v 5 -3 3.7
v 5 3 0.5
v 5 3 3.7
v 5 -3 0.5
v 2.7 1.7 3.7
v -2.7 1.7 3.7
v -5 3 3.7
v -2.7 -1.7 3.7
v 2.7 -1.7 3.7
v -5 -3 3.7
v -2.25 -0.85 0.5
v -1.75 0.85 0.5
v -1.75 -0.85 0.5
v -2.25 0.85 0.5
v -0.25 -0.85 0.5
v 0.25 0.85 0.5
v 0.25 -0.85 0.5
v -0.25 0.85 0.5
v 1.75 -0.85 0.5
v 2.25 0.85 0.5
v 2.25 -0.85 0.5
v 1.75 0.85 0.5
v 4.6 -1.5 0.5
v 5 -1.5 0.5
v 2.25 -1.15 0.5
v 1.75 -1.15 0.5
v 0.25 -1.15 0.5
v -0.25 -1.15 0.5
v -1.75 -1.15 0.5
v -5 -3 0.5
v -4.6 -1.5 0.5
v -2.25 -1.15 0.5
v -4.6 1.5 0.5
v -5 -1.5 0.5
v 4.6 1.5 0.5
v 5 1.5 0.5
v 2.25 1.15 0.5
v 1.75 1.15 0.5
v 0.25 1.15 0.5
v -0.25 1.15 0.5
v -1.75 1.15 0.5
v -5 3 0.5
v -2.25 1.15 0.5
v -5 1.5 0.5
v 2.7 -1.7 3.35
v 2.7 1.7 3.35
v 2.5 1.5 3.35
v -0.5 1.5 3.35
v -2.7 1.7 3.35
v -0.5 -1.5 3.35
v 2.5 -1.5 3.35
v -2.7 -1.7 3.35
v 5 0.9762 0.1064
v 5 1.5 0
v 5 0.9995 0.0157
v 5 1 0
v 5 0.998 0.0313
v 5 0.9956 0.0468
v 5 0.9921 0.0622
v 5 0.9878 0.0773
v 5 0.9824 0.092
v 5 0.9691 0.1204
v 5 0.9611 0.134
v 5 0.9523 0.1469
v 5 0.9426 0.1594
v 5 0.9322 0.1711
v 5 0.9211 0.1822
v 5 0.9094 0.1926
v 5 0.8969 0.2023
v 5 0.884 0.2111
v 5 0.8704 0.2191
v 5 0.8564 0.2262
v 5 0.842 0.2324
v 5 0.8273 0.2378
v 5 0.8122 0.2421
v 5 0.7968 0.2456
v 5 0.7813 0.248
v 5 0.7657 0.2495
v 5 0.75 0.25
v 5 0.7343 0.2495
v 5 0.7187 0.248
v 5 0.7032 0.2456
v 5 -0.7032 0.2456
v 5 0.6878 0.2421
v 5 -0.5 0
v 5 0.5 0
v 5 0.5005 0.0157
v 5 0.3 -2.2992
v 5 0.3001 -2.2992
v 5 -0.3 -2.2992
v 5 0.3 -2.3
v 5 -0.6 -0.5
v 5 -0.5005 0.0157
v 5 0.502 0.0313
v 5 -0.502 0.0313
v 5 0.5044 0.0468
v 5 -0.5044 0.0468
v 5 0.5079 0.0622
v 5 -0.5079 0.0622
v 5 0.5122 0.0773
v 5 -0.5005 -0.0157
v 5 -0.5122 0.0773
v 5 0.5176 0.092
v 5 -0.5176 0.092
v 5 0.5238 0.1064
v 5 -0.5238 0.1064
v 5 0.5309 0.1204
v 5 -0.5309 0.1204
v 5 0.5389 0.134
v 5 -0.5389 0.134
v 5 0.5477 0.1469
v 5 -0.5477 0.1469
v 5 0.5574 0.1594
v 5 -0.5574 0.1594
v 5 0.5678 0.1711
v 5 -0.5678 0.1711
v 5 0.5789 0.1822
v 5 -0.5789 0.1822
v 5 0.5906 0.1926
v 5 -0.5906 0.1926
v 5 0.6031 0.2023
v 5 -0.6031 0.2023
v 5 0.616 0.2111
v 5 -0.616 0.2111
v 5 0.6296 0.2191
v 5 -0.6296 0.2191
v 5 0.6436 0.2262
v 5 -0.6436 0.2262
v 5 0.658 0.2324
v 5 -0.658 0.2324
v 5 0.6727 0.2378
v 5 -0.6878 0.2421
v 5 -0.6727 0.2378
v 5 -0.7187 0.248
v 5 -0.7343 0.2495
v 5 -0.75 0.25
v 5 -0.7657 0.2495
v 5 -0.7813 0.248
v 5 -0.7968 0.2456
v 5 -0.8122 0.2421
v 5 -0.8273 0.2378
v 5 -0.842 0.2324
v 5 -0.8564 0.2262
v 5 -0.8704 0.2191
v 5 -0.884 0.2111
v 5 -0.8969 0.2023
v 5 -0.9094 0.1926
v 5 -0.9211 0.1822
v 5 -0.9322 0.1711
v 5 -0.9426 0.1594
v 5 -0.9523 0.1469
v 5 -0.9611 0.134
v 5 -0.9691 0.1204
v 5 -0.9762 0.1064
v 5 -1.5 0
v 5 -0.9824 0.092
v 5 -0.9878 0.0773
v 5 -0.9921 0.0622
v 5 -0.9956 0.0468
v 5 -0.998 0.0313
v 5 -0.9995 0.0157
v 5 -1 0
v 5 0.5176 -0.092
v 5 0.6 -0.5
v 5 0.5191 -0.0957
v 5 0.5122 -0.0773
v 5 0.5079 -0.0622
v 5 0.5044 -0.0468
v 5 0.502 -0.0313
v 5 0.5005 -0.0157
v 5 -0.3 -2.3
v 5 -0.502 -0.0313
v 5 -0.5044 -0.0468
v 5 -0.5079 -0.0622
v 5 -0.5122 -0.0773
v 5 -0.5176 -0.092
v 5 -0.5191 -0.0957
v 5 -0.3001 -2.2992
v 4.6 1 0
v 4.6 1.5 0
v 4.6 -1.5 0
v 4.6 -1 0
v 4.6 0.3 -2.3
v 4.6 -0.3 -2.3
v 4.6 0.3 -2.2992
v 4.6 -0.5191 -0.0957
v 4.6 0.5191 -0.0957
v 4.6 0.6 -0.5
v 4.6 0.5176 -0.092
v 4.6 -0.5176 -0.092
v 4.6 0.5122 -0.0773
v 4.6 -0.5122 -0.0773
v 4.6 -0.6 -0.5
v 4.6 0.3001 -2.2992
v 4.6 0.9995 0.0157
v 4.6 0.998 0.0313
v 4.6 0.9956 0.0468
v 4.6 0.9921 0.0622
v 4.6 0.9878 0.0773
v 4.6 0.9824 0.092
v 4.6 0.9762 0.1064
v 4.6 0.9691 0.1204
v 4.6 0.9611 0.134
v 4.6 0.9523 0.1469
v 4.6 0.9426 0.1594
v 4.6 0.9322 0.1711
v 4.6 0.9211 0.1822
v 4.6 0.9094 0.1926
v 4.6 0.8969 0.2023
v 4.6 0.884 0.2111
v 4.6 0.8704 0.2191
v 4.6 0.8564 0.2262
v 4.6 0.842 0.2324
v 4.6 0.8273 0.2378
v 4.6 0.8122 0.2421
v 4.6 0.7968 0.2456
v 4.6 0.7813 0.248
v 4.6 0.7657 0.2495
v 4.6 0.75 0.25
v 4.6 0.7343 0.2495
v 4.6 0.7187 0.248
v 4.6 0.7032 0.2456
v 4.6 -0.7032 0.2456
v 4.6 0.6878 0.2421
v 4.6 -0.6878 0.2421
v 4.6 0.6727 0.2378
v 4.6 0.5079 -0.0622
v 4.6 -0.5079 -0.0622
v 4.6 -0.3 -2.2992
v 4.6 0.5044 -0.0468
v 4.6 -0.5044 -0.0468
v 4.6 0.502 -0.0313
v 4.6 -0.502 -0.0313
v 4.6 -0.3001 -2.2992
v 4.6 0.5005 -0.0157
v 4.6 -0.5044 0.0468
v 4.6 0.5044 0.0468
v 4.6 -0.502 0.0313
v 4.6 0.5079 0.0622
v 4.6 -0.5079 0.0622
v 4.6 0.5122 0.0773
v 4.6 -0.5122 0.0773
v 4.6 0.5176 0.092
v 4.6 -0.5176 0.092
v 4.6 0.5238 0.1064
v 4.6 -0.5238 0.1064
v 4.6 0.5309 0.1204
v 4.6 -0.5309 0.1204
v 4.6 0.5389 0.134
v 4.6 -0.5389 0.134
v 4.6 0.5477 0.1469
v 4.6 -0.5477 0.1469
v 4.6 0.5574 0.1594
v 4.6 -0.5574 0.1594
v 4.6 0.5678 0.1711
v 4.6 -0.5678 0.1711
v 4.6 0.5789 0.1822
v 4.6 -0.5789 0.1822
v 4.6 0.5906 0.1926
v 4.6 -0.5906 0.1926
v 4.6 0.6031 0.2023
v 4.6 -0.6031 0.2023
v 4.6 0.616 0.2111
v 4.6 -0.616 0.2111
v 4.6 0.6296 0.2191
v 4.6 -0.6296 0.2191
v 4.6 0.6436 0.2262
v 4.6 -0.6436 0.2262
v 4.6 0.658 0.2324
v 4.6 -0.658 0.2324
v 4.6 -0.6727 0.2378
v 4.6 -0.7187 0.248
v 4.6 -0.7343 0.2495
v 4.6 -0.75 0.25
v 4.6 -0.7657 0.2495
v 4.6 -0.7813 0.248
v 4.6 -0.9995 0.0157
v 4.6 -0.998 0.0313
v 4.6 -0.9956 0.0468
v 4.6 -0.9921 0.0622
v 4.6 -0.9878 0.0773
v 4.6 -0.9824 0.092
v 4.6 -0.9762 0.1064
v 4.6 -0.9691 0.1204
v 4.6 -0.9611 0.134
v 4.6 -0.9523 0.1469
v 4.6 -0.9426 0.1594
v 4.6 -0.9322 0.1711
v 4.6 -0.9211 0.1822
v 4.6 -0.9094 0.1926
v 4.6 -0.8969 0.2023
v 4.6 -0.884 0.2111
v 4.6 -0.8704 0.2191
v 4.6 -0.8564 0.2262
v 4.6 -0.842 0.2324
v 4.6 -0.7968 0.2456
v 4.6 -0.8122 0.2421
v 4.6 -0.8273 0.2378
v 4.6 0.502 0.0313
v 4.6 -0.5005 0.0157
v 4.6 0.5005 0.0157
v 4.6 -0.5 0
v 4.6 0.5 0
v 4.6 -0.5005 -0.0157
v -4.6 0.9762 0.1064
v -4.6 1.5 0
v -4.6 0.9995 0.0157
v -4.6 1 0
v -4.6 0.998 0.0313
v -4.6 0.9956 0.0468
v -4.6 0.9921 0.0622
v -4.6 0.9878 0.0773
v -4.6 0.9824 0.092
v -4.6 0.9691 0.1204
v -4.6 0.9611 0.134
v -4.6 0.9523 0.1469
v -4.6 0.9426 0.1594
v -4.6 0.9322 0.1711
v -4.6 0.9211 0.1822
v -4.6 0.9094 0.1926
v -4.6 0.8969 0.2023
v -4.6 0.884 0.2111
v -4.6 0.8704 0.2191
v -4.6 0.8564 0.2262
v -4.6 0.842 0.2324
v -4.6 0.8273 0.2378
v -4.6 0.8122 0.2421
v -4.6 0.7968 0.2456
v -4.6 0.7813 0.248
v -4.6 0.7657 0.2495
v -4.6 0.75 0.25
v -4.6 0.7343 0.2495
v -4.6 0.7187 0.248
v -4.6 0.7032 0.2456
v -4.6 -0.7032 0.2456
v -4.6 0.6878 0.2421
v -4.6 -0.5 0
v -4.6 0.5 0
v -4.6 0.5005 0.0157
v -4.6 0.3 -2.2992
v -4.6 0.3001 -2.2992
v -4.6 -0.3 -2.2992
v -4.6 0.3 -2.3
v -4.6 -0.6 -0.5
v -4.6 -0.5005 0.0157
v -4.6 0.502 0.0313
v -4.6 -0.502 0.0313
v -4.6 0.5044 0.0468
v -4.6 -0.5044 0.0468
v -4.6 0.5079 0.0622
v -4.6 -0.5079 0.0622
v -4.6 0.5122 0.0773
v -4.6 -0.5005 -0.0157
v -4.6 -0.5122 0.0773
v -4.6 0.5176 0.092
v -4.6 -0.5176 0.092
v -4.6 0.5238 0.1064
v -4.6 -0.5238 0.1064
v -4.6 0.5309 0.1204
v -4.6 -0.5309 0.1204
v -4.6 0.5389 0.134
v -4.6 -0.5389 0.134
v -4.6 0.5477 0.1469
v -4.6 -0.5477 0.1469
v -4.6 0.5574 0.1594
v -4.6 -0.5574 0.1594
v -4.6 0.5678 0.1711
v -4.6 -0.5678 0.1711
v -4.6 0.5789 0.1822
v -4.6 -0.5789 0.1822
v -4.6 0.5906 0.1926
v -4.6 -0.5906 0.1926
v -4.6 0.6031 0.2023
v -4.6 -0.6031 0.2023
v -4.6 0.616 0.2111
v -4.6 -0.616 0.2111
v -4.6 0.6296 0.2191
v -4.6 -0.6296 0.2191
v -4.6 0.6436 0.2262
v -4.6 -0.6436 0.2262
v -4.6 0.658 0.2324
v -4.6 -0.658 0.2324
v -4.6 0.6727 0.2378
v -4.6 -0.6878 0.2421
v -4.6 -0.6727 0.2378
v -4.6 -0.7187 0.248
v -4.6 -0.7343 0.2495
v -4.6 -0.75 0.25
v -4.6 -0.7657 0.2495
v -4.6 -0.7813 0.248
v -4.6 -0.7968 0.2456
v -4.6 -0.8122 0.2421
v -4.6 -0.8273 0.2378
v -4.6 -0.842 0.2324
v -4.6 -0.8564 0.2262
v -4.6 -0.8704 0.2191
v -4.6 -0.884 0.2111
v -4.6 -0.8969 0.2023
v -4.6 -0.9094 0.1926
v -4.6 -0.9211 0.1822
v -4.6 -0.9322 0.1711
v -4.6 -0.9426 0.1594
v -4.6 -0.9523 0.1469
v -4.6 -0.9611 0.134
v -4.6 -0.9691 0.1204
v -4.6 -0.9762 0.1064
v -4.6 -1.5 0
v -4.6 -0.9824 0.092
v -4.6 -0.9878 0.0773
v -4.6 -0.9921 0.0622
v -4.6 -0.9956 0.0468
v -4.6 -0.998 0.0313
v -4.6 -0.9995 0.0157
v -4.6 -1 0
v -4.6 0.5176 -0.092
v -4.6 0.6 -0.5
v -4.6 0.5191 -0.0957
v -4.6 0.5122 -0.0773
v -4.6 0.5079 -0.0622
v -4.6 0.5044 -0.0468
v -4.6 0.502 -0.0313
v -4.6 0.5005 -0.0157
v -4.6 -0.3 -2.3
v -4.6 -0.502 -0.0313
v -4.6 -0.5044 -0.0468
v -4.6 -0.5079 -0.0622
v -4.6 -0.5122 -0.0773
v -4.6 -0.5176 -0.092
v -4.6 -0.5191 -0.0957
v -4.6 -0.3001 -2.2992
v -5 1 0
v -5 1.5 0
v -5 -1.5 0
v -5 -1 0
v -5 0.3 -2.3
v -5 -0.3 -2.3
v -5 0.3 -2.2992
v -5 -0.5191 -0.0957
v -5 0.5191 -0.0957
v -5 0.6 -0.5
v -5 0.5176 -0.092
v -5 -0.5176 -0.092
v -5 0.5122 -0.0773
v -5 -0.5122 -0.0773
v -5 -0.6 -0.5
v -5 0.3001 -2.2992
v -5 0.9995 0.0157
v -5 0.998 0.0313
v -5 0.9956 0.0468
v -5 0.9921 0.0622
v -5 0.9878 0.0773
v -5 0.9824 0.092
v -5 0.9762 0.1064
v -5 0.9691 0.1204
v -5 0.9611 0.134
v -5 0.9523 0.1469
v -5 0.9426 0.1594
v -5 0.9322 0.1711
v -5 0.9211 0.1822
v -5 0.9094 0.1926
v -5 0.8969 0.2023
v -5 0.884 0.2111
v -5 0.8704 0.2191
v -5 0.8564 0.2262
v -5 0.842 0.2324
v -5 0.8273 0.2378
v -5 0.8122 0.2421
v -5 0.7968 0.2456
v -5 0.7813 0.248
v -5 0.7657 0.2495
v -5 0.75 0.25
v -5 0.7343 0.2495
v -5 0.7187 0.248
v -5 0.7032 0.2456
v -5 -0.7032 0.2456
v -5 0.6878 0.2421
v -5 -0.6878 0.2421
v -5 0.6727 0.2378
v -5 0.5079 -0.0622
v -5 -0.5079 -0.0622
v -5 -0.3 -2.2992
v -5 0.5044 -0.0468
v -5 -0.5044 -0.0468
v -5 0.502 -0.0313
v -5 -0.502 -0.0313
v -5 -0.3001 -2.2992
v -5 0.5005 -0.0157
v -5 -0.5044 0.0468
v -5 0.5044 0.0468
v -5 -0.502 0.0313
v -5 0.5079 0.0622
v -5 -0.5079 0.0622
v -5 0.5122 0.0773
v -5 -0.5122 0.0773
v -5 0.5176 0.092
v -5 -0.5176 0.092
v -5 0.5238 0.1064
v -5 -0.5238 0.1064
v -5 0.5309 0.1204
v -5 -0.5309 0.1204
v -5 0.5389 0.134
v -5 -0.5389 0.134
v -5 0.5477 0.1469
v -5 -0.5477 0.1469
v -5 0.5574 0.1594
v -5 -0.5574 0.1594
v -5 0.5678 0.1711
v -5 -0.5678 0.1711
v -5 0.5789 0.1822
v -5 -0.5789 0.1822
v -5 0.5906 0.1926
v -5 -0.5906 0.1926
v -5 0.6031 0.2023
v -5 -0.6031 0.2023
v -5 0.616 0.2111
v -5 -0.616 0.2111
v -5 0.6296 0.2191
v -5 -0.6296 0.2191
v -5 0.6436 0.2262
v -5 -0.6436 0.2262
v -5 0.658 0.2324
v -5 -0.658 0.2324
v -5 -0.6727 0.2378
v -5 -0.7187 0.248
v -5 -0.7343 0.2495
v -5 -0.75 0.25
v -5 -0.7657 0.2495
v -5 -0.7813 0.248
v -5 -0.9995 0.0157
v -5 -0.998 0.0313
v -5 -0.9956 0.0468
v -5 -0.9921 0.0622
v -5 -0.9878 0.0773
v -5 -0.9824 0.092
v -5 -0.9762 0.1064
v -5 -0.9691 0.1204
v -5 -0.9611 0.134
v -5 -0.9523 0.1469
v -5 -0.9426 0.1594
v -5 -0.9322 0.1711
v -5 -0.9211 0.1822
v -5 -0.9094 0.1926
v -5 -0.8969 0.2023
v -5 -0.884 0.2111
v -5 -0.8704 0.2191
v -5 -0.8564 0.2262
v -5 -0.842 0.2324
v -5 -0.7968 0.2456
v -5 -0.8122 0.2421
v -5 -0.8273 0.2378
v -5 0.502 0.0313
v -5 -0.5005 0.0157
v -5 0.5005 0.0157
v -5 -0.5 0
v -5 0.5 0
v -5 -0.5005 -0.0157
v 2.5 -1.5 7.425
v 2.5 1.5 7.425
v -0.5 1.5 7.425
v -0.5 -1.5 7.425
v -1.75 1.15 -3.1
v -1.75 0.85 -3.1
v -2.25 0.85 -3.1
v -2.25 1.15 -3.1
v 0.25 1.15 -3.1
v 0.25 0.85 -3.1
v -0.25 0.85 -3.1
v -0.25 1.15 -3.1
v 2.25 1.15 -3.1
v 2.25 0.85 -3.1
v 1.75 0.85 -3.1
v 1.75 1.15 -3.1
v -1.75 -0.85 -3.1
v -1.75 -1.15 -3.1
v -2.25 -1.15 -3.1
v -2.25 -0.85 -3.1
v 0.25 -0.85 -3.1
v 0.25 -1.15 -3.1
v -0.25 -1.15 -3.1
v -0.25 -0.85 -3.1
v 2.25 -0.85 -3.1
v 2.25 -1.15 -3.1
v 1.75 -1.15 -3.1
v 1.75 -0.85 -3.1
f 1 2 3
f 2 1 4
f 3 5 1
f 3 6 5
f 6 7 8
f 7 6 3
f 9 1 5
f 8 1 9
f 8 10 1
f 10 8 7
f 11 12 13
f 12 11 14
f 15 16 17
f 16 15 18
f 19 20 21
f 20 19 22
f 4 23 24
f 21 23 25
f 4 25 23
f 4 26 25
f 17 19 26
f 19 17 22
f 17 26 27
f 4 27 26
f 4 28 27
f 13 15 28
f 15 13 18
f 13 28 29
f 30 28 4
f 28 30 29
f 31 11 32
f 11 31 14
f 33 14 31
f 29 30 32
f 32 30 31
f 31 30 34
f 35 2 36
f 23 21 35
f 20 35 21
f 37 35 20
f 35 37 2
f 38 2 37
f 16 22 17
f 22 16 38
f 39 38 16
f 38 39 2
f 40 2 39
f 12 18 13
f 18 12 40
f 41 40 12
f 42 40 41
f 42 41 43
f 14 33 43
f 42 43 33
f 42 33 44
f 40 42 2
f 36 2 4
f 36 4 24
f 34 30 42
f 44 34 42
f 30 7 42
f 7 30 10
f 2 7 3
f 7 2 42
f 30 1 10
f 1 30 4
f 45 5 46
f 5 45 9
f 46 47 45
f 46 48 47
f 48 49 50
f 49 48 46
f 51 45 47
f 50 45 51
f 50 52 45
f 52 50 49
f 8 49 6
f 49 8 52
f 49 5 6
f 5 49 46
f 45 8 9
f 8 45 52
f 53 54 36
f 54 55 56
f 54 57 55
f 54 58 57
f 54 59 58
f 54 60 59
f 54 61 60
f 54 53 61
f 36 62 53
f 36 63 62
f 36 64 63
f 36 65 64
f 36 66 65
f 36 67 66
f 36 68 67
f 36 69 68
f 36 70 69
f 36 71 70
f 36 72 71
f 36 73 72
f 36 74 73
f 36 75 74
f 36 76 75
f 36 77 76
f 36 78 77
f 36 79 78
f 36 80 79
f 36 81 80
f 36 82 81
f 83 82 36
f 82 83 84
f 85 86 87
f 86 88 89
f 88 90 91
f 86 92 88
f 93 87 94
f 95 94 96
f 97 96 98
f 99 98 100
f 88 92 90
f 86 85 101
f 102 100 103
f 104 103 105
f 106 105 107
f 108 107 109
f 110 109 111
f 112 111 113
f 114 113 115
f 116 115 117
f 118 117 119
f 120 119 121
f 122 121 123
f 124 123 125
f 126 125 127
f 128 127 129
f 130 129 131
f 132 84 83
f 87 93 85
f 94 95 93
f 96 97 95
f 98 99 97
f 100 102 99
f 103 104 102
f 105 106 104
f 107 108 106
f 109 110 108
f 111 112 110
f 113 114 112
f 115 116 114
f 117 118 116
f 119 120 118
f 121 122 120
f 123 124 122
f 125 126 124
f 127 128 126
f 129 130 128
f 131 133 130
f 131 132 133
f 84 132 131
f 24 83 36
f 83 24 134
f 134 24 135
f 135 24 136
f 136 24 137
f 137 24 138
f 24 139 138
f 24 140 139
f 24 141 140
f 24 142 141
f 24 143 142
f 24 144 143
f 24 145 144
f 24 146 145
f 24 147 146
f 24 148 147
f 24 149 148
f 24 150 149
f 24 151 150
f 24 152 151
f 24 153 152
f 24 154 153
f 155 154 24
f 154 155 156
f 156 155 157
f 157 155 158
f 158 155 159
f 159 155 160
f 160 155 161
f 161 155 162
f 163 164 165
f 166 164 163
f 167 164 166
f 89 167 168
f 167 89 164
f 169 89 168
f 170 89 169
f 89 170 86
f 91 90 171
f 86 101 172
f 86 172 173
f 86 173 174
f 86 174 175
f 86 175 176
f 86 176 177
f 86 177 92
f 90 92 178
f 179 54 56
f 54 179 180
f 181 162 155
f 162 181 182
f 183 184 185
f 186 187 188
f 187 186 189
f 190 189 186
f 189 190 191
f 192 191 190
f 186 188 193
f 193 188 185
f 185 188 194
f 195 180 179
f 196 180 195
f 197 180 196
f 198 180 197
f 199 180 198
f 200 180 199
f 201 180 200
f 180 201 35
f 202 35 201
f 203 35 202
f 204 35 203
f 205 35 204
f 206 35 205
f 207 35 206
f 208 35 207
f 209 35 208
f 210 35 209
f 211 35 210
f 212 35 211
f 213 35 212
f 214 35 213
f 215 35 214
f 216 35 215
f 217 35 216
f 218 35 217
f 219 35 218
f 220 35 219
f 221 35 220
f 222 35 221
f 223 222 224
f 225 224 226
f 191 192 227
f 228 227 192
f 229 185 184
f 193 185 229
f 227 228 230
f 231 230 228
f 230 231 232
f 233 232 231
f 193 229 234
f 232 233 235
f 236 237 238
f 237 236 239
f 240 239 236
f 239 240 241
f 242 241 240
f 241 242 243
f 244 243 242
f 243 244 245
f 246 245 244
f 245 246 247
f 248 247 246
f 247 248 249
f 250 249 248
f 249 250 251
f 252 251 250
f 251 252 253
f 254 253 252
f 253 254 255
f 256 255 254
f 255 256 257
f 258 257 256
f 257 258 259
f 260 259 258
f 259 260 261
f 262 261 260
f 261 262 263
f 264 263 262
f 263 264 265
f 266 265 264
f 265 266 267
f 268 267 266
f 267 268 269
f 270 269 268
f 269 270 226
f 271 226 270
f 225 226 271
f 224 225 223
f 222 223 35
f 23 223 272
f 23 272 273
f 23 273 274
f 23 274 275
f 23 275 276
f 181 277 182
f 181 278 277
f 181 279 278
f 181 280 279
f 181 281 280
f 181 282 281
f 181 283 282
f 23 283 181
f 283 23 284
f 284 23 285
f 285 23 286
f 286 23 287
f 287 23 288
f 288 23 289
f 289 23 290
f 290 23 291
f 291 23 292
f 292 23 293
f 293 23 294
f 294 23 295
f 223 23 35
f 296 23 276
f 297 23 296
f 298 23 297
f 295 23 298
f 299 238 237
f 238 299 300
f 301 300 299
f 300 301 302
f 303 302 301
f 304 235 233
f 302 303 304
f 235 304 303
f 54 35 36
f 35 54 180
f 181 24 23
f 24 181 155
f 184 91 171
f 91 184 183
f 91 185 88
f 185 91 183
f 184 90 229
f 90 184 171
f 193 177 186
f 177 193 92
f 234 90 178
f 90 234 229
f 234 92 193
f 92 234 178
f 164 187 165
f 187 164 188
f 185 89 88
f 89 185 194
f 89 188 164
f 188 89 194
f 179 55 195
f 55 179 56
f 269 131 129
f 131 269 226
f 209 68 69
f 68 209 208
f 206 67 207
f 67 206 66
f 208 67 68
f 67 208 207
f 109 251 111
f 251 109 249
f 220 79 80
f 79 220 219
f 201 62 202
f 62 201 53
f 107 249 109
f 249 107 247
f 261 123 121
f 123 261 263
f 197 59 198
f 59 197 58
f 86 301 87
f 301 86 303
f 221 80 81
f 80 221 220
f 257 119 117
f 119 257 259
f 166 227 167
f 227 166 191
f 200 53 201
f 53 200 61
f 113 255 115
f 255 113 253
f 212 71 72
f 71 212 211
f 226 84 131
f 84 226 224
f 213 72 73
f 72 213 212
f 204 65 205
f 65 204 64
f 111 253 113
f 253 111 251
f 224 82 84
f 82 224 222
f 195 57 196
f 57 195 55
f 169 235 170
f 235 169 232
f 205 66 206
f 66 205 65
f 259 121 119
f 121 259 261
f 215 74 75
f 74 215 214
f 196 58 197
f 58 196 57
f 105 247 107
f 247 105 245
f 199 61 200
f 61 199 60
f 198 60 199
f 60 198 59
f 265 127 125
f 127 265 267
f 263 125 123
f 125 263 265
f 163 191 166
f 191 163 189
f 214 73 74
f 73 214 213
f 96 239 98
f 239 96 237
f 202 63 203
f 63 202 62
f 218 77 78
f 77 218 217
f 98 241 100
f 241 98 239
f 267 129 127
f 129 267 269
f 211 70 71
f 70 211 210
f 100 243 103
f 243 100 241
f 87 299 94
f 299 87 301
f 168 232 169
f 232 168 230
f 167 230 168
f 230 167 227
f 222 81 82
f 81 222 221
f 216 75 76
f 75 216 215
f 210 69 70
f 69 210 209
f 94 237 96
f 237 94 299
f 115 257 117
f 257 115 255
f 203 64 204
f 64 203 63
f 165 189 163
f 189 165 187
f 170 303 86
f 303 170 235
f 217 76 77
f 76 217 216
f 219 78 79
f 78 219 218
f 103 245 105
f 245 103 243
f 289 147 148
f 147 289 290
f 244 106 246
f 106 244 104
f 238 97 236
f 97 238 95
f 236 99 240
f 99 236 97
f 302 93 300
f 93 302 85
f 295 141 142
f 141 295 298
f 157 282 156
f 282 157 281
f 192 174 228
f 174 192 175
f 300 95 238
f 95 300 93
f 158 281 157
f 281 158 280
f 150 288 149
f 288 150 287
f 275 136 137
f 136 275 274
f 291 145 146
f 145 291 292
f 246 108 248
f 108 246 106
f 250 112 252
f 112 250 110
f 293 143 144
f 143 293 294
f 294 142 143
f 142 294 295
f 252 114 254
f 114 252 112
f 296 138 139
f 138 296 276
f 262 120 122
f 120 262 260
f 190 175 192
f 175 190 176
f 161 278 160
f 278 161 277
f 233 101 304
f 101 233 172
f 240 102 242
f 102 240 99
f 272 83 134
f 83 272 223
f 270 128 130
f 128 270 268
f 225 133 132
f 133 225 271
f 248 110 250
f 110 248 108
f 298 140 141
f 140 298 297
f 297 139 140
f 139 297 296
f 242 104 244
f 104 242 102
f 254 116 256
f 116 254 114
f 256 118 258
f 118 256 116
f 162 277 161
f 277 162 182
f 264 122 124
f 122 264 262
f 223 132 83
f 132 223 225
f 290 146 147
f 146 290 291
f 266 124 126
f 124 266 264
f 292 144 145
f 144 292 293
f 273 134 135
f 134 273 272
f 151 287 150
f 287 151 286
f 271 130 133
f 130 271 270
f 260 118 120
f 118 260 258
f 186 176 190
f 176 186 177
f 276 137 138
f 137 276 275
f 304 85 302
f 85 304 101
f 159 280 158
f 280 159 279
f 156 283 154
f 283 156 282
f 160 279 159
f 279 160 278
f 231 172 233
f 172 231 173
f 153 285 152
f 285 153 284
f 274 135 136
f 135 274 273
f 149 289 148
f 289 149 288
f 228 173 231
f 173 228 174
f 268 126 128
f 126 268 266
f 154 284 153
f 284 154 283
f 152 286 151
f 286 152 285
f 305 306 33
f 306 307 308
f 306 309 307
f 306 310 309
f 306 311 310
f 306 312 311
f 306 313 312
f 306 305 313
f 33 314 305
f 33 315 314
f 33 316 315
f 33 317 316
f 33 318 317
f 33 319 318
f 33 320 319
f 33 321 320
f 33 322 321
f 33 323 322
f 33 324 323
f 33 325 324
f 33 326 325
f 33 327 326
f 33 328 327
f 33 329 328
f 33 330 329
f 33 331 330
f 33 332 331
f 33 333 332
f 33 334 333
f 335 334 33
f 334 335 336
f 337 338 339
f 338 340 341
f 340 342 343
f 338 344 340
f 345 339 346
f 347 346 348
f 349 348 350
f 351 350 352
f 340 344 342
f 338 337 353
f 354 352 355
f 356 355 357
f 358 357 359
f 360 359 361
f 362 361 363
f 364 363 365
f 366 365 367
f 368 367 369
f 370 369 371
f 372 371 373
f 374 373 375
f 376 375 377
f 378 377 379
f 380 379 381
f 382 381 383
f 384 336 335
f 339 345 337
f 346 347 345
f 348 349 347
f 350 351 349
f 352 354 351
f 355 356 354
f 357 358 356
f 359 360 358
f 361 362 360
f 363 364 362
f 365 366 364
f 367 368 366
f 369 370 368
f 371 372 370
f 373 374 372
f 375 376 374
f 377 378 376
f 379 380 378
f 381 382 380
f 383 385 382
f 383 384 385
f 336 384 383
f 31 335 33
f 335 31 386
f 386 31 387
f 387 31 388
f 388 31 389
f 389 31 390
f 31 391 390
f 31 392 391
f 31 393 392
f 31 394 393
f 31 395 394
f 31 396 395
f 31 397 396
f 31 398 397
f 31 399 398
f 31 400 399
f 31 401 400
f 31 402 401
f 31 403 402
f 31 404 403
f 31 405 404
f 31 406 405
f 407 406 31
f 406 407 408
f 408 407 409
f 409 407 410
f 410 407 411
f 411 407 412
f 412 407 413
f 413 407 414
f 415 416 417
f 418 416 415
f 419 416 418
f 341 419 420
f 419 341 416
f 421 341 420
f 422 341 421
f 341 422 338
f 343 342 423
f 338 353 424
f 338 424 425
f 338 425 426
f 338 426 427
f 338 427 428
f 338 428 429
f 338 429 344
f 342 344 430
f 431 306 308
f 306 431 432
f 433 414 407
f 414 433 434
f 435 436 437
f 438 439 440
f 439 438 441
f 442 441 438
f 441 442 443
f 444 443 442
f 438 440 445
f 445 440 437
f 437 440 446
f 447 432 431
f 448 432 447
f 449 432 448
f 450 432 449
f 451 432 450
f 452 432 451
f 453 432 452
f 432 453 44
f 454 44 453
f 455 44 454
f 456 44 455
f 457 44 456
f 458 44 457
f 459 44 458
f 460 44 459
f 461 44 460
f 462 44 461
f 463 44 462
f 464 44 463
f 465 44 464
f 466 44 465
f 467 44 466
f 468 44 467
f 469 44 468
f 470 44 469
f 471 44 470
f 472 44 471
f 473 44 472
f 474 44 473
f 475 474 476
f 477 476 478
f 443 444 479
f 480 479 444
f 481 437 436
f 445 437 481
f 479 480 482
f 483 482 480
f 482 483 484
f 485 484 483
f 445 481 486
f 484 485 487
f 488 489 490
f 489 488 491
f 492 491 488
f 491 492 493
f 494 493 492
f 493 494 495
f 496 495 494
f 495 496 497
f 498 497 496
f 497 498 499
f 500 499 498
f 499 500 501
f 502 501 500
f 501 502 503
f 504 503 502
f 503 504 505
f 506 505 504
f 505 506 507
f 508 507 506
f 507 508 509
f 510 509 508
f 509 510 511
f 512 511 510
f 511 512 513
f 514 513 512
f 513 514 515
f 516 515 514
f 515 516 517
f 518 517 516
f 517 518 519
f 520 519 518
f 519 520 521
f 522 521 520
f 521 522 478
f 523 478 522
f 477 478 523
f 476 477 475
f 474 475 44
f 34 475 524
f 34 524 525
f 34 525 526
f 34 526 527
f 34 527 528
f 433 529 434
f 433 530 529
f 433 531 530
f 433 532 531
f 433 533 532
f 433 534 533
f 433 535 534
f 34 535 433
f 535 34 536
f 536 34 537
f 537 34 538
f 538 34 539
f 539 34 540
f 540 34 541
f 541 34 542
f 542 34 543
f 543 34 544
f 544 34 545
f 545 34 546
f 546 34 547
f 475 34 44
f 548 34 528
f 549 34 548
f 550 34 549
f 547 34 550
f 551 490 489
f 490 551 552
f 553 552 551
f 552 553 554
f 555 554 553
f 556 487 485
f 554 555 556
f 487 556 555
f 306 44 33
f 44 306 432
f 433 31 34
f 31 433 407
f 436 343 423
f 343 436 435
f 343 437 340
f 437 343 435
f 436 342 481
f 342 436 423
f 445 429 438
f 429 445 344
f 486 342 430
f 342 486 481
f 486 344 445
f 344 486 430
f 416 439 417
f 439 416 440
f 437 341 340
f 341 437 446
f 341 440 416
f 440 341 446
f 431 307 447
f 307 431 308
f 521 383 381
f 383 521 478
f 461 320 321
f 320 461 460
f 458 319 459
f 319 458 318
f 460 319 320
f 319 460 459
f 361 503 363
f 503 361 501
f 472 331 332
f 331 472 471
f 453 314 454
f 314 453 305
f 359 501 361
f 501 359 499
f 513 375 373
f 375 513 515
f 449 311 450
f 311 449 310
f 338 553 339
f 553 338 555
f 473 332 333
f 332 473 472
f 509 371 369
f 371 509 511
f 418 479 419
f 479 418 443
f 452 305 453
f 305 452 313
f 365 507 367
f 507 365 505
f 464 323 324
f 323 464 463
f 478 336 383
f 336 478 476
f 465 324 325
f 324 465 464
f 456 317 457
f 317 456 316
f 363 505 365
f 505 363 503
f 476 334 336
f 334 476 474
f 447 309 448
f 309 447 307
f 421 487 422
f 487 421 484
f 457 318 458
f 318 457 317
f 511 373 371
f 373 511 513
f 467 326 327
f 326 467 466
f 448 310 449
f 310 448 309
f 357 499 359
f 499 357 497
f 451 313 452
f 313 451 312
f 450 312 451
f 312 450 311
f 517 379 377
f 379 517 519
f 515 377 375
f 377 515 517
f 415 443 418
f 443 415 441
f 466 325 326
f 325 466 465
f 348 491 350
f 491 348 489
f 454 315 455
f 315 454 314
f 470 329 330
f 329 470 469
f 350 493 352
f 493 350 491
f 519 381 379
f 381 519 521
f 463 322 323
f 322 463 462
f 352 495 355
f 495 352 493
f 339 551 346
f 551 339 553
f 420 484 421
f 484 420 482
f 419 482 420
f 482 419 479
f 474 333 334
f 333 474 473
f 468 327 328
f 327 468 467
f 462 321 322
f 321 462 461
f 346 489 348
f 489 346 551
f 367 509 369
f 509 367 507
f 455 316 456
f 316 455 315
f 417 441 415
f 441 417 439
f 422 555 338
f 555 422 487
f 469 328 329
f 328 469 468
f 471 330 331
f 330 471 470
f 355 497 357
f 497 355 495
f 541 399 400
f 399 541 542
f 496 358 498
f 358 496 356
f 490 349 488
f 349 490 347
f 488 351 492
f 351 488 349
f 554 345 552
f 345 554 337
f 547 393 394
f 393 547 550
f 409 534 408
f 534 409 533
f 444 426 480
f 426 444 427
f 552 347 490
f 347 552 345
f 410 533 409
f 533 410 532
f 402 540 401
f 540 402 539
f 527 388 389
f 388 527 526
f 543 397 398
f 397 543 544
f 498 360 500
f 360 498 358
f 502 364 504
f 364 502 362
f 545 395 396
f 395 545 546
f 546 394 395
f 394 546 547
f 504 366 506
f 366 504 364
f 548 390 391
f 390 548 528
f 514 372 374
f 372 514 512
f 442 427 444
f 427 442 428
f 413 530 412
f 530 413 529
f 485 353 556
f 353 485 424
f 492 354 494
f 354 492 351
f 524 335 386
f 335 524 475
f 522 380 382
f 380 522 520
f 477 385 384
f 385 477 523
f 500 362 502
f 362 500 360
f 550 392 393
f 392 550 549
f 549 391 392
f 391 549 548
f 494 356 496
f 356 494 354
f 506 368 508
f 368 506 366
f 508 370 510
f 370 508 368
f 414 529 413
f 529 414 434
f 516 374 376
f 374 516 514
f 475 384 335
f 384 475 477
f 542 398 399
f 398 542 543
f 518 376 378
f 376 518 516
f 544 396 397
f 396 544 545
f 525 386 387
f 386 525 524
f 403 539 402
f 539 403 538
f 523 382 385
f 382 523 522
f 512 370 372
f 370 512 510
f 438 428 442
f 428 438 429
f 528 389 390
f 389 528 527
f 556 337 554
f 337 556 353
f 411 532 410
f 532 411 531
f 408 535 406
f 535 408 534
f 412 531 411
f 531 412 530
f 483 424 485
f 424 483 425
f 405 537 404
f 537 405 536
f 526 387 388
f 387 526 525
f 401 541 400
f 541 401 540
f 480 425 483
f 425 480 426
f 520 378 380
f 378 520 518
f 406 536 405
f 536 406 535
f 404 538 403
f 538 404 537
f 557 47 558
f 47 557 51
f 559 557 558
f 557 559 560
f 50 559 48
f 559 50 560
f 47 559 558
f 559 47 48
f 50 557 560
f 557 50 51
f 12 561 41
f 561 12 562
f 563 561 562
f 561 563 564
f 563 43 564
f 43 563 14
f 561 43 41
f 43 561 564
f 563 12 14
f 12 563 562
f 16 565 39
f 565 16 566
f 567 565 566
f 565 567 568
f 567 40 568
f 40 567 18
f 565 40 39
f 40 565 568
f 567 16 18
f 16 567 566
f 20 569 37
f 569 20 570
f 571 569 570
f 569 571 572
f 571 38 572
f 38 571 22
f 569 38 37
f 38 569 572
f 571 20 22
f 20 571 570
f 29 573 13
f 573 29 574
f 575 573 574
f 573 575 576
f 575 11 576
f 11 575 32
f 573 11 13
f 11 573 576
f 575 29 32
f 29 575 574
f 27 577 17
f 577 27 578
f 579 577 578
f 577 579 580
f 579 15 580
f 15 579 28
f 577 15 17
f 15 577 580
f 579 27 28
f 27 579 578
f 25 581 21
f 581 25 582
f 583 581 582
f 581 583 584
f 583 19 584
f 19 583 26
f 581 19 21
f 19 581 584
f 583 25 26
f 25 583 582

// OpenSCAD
/*
 * Creates a DPDT switch manufactured by E-Switch.
 * 
 * Author: Ian McInerney
 * Created: June 25, 2013
 */

module pin() {
	translate([0.0,0.0,-1.3])cube(size=[0.5,0.3,3.6], center=true);
}

module sideSupport() {
difference() {
	union() {
		translate([0.0,0.0,0.25])cube(size=[0.4,3.0,0.5], center=true);
		translate([0.0,0.0,-1.15])cube(size=[0.4,0.6, 2.3], center=true);
		translate([0.0,-0.6,-0.5])rotate([78.69,0.0,0.0])translate([0.0,0.5,-0.25495])cube(size=[0.4,1.0,0.5099], center=true);
		translate([0.0,-0.6,-0.5])rotate([9.462,0.0,0.0])translate([0.0,0.25,-0.912])cube(size=[0.4,0.5,1.824], center=true);
		rotate([0.0,0.0,180.0])translate([0.0,-0.6,-0.5])rotate([78.69,0.0,0.0])translate([0.0,0.5,-0.25495])cube(size=[0.4,1.0,0.5099], center=true);
		rotate([0.0,0.0,180.0])translate([0.0,-0.6,-0.5])rotate([9.462,0.0,0.0])translate([0.0,0.25,-0.912])cube(size=[0.4,0.5,1.824], center=true);
	}
	translate([-0.3,0.75,0.0])rotate([0.0,90.0,0.0])cylinder(r=0.25, h=0.8, $fn=100, center=false);
	translate([-0.3,-0.75,0.0])rotate([0.0,90.0,0.0])cylinder(r=0.25, h=0.8, $fn=100, center=false);
}

}

// The main cube
difference() {
	// The main switch cube
	translate([0.0,0.0,2.1])cube(size=[10.0,6.0,3.2], center=true);

	// the cutout for the switch handle
	translate([0.0,0.0,3.55])cube(size=[5.4,3.4,0.4], center=true);
}

// The switch handle
translate([1.0,0.0,3.7-0.35+2.0])cube(size=[3.0,3.0,4.15], center=true);


// The pins
translate([-2.0,1.0,0.0])pin();
translate([0.0,1.0,0.0])pin();
translate([2.0,1.0,0.0])pin();
translate([-2.0,-1.0,0.0])pin();
translate([0.0,-1.0,0.0])pin();
translate([2.0,-1.0,0.0])pin();

// The side supports
translate([4.8,0.0,0.0])sideSupport();
translate([-4.8,0.0,0.0])sideSupport();
